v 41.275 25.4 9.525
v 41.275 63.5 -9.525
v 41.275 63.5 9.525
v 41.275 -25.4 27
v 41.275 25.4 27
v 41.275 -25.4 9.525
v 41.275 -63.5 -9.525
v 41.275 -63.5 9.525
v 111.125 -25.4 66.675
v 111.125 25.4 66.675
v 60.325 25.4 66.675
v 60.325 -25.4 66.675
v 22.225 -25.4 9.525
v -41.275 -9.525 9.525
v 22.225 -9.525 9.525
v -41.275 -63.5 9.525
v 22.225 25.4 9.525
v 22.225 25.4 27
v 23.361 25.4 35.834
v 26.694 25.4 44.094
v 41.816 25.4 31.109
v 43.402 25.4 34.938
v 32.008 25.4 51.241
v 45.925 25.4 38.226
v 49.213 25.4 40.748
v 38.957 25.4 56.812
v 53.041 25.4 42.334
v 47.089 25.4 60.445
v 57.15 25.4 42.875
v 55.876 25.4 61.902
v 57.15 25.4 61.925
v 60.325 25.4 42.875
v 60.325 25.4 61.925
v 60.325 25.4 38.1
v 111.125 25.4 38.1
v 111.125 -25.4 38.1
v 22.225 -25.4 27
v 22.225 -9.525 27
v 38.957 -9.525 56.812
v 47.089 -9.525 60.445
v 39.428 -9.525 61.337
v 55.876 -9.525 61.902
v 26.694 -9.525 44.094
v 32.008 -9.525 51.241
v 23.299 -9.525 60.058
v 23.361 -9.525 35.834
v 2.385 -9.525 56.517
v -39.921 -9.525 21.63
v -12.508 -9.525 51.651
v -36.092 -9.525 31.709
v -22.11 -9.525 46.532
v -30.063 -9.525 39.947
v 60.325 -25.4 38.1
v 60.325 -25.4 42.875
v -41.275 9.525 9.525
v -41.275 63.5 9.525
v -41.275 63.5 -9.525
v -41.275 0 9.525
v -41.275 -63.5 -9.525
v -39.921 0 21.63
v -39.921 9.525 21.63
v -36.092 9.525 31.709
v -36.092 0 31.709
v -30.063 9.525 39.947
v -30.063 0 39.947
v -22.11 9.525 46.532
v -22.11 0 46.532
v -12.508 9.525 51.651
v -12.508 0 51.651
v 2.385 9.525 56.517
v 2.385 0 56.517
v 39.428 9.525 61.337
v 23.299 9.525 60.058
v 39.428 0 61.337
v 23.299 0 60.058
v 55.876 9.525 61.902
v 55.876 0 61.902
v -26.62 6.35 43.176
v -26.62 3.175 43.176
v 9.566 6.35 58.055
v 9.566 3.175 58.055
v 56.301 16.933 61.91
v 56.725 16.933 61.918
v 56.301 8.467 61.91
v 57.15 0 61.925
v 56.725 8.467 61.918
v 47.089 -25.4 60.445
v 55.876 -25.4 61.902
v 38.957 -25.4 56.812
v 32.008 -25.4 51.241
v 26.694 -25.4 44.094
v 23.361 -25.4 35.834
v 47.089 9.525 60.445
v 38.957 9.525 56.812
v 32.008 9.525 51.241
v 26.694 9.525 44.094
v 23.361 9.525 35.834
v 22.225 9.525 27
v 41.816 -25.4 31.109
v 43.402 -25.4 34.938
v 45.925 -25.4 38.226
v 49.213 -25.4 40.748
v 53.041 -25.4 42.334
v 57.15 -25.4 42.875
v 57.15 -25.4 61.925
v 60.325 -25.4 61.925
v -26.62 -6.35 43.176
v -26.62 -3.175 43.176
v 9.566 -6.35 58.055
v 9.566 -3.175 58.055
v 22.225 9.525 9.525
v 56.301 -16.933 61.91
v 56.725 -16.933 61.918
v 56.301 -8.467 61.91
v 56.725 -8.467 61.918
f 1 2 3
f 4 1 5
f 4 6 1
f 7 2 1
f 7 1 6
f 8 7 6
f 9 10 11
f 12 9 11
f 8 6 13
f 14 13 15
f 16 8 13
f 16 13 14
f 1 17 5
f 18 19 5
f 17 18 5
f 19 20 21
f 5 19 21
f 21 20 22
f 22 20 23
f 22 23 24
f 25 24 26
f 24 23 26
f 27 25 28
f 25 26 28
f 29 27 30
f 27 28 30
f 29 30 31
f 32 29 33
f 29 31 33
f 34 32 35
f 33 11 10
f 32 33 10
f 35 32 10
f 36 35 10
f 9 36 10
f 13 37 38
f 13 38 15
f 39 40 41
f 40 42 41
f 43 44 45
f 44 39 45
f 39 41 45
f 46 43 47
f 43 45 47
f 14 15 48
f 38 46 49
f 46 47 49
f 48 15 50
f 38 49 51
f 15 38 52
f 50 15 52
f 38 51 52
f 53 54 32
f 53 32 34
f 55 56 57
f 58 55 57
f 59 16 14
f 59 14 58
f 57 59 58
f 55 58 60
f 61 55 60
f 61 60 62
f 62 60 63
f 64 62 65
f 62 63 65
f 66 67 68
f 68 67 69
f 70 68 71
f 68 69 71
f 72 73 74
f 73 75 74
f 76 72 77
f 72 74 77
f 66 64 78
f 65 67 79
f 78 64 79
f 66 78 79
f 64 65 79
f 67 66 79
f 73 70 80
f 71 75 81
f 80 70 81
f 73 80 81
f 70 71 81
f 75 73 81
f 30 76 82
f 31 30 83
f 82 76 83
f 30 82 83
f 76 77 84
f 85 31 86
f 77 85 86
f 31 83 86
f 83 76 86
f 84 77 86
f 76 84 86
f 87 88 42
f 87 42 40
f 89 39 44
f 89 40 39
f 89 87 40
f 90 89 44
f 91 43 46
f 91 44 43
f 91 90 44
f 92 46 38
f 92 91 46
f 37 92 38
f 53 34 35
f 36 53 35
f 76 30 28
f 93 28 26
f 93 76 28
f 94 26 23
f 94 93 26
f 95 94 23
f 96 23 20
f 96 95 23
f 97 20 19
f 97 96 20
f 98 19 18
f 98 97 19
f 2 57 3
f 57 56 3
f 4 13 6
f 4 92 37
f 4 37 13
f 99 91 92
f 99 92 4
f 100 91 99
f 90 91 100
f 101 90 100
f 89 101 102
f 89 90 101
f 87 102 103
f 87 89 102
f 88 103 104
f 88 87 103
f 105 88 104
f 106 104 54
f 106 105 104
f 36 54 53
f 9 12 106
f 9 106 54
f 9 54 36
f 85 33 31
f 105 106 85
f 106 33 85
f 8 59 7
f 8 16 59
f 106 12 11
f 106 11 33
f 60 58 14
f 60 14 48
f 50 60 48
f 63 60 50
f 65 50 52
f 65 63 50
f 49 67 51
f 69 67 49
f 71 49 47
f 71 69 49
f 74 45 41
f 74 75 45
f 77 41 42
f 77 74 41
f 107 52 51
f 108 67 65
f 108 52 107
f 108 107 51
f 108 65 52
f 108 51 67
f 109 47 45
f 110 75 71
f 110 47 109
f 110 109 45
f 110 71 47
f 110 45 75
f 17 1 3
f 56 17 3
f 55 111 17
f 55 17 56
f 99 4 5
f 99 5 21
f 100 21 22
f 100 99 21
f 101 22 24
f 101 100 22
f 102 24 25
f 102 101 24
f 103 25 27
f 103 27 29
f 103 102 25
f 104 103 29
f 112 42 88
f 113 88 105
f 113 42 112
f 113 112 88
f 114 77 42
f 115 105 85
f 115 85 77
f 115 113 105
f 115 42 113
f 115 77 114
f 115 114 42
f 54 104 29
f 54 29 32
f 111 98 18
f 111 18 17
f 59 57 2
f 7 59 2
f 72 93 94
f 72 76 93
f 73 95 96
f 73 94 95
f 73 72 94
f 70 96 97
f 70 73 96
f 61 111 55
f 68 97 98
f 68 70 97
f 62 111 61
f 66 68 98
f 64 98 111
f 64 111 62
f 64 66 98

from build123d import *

# Parameters (mm, degrees)
F1_DEPTH = 63.5
F2_DEPTH = 25.4
F3_DEPTH = 9.525


with BuildPart() as f1:
    # F0 (on Front) → F1 (new body, symmetric)
    with BuildSketch(Plane.XZ):
        Polygon((-41.275, -9.525), (41.275, -9.525), (41.275, 9.525), (22.225, 9.525), (-41.275, 9.525), align=None)
    extrude(amount=F1_DEPTH, both=True)

    # F0 (on Front) → F2 (join, symmetric)
    with BuildSketch(Plane.XZ):
        with BuildLine():
            Line((22.225, 9.525), (41.275, 9.525))
            Line((41.275, 9.525), (41.275, 27.0002))
            ThreePointArc((41.275, 27.0002), (45.92468, 38.22552), (57.15, 42.8752))
            Line((57.15, 42.8752), (60.325, 42.8752))
            Line((60.325, 42.8752), (60.325, 61.9252))
            Line((60.325, 61.9252), (57.15, 61.9252))
            add(Edge.make_bspline(
                [(55.875812, 61.901949), (56.300707, 61.910085), (56.725448, 61.917827), (57.15, 61.9252)],
                knots=[110.51738, 110.51738, 110.51738, 110.51738, 111.504536, 111.504536, 111.504536, 111.504536], degree=3))
            ThreePointArc((55.875812, 61.901949), (32.007838, 51.241225), (22.225, 27.0002))
            Line((22.225, 27.0002), (22.225, 9.525))
        make_face()
        Polygon((60.325, 61.9252), (60.325, 42.8752), (60.325, 38.1), (111.125, 38.1), (111.125, 66.675), (60.325, 66.675), align=None)
    extrude(amount=F2_DEPTH, both=True)

    # F0 (on Front) → F3 (join, symmetric)
    with BuildSketch(Plane.XZ):
        with BuildLine():
            add(Edge.make_bspline(
                [(-41.275, 9.525), (-41.187675, 55.142385), (8.306509, 60.991071), (55.875812, 61.901949)],
                knots=[0, 0, 0, 0, 110.51738, 110.51738, 110.51738, 110.51738], degree=3))
            Line((-41.275, 9.525), (22.225, 9.525))
            Line((22.225, 9.525), (22.225, 27.0002))
            ThreePointArc((22.225, 27.0002), (32.007838, 51.241225), (55.875812, 61.901949))
        make_face()
    extrude(amount=F3_DEPTH, both=True)


solid = f1.part
